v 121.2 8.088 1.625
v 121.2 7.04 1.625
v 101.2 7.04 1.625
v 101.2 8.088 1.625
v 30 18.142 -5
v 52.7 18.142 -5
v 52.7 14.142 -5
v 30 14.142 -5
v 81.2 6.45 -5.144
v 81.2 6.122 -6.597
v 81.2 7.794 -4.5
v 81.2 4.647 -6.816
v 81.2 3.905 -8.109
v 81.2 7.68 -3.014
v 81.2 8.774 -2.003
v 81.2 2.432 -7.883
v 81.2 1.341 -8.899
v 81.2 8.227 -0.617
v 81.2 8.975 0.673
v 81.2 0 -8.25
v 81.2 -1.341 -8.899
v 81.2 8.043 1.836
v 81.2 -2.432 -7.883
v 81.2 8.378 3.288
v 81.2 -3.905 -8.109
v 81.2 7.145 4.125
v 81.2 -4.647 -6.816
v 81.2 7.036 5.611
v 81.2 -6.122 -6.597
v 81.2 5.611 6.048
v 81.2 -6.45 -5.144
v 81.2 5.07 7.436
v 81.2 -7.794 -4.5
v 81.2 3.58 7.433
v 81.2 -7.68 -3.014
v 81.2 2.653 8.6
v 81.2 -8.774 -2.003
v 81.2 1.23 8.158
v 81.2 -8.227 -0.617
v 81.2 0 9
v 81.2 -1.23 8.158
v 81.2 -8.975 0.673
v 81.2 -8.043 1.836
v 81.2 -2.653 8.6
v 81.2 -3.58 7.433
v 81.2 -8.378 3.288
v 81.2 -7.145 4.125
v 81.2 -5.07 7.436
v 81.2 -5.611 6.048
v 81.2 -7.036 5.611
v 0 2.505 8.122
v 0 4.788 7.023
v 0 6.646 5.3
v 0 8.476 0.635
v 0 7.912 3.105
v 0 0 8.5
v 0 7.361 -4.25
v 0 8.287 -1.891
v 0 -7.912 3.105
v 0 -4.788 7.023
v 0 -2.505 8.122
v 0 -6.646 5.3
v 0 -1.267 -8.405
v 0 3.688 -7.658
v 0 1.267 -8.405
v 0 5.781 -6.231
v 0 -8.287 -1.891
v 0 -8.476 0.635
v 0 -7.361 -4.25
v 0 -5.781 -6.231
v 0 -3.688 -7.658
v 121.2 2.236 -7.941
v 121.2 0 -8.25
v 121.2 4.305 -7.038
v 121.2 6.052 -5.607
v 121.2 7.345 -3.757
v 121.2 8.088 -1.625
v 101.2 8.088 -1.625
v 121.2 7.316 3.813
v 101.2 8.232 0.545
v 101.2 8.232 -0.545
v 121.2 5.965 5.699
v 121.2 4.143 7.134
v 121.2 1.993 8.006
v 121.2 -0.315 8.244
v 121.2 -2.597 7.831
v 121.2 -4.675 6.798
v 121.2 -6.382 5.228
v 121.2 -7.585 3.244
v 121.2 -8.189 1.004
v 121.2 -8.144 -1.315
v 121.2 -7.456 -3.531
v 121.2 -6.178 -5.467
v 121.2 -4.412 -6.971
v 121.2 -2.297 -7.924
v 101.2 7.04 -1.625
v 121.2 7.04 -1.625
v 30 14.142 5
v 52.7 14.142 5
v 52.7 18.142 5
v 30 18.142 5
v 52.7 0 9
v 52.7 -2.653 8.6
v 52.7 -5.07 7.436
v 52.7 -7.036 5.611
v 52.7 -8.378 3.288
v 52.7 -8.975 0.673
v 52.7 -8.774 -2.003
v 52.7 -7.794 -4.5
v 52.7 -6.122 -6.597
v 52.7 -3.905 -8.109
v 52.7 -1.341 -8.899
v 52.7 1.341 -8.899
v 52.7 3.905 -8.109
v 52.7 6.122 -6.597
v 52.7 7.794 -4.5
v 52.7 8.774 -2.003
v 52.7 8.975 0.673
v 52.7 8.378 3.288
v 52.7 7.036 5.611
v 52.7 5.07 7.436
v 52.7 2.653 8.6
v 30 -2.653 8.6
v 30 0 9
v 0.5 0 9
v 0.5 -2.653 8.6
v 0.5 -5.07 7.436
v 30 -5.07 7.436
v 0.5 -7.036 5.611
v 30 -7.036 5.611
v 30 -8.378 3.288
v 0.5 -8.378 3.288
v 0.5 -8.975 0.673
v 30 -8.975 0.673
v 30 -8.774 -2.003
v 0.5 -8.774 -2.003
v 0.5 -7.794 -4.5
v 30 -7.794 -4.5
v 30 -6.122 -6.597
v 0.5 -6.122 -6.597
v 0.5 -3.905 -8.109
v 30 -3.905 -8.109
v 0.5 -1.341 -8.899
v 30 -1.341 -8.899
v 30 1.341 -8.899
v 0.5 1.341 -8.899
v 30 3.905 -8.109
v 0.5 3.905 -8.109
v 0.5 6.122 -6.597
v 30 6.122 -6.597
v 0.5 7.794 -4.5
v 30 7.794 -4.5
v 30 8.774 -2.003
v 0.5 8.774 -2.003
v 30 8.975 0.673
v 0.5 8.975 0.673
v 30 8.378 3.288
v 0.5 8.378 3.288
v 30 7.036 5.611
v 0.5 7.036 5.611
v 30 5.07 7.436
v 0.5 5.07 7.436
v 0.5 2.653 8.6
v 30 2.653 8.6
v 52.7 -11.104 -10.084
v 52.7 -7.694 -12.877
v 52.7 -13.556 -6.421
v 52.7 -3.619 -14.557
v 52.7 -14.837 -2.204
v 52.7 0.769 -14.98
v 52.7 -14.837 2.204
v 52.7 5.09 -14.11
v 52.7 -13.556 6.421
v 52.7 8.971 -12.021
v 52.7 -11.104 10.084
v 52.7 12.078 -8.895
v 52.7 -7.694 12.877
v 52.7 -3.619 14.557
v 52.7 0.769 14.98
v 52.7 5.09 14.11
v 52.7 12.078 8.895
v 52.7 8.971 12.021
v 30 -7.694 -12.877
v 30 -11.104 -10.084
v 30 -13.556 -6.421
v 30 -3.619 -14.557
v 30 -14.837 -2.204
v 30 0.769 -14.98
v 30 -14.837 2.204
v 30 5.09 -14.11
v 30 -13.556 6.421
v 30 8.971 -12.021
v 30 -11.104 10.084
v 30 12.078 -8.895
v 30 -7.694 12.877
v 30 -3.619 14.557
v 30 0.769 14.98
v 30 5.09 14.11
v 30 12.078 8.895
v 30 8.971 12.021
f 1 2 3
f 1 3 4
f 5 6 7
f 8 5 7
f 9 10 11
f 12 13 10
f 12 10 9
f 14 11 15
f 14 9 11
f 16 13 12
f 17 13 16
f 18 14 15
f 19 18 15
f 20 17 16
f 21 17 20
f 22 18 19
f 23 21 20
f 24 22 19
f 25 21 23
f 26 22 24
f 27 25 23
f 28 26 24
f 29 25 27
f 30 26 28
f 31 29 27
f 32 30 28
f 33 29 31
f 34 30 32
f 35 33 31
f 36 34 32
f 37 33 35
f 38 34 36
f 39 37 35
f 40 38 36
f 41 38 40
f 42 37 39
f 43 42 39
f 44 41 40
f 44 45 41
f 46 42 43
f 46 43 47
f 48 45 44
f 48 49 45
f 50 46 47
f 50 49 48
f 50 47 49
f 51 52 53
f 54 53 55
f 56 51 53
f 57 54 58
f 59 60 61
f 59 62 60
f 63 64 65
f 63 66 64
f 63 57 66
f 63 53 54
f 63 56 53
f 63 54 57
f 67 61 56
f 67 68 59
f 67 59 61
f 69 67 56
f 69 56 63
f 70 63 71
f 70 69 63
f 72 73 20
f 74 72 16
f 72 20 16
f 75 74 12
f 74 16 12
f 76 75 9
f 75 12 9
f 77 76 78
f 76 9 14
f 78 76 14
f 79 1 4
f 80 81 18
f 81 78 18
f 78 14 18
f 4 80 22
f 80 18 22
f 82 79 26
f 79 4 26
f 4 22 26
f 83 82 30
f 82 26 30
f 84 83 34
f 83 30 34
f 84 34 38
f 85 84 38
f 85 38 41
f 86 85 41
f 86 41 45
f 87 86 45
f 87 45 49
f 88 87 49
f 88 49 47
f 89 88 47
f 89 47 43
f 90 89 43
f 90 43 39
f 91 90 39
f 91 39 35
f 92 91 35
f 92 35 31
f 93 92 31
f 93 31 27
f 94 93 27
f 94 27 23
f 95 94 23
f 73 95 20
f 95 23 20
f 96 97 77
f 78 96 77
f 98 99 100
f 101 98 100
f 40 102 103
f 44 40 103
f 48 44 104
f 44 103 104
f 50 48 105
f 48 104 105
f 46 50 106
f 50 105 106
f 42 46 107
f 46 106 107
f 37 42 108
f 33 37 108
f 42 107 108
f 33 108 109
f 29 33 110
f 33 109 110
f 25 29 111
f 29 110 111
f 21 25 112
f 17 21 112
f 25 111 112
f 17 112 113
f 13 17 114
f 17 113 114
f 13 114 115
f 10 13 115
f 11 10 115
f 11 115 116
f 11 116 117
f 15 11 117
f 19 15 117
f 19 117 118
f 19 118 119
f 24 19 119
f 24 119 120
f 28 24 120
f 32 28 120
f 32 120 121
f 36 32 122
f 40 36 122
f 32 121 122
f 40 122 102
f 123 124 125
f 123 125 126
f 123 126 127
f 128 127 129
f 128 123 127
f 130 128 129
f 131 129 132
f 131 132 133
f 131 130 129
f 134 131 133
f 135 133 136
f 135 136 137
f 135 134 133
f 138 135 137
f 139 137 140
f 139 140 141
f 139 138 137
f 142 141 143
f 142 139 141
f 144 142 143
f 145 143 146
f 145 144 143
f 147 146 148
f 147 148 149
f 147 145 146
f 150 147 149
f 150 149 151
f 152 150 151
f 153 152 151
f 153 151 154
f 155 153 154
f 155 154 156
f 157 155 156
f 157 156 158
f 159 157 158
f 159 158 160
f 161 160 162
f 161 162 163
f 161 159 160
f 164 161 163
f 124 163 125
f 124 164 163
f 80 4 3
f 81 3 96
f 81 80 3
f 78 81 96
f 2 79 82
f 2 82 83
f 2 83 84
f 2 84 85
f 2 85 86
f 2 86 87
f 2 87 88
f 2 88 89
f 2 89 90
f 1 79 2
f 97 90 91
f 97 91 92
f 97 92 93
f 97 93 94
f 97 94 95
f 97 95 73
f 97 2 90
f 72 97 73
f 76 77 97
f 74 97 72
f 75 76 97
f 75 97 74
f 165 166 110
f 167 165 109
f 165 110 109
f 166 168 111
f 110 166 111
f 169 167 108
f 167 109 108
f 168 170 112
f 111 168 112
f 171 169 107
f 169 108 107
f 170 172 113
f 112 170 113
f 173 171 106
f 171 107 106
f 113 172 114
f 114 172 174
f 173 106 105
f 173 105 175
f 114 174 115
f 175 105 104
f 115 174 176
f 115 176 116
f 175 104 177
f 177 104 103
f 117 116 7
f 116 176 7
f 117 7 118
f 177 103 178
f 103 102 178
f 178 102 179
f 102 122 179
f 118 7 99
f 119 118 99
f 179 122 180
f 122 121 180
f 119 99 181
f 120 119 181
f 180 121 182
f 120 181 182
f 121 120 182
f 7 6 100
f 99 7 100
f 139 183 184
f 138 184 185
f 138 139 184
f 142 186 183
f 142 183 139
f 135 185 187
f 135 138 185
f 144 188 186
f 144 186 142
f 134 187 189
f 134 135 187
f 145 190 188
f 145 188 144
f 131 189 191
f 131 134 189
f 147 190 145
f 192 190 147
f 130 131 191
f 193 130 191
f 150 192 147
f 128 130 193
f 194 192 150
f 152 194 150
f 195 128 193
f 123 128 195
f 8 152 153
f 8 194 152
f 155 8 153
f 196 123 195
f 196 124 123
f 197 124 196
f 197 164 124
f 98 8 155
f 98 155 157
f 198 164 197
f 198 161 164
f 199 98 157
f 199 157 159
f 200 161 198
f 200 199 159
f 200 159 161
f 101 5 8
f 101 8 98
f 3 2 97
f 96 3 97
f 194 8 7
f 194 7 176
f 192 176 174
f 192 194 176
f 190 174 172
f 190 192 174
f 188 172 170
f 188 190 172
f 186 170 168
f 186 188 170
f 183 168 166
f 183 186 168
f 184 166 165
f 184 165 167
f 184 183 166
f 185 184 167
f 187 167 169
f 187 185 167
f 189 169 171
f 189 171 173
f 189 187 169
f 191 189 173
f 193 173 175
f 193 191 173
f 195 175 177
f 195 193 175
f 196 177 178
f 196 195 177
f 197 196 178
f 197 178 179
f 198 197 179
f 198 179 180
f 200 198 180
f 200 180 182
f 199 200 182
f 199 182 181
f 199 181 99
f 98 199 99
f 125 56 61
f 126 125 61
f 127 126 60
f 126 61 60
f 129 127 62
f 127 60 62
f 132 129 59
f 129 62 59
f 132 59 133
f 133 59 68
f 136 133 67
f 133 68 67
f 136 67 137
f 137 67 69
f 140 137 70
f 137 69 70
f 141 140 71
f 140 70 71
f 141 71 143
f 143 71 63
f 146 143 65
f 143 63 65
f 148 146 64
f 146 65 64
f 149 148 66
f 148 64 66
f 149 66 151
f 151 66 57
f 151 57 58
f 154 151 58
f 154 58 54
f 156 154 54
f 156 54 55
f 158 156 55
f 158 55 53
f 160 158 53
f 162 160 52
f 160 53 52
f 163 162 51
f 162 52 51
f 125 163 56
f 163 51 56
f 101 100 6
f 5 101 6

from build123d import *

# Parameters (mm, degrees)
SKETCH1_W           = 30
SKETCH1_H           = 9
BOSS_EXTRUDE1_DEPTH = 22.7
SKETCH3_R           = 9
BOSS_EXTRUDE2_DEPTH = 28.5
SKETCH4_R           = 8.25
BOSS_EXTRUDE3_DEPTH = 40
SKETCH5_W           = 3.25
SKETCH5_H           = 1.5
CUT_EXTRUDE1_DEPTH  = 20
CHAMFER1_SIZE       = 0.5


with BuildPart() as part:
    # Sketch1 → Revolve1 (revolve)
    with BuildSketch(Plane.XY, mode=Mode.PRIVATE) as revolve1_sk:
        with Locations((15, 4.5)):
            Rectangle(SKETCH1_W, SKETCH1_H)
    revolve(revolve1_sk.sketch.rotate(Axis((0, 0, 0), (1, 0, 0)), 90), axis=Axis((0, 0, 0), (1, 0, 0)))

    # Sketch2 → Boss-Extrude1 (add)
    with BuildSketch(Plane(origin=(30, 0, 0), x_dir=(0, 0, -1), z_dir=(1, 0, 0))):
        with BuildLine():
            Line((-5, 18.142135624), (5, 18.142135624))
            Line((5, 18.142135624), (5, 14.142135624))
            ThreePointArc((5, 14.142135624), (0, -15), (-5, 14.142135624))
            Line((-5, 14.142135624), (-5, 18.142135624))
        make_face()
    extrude(amount=BOSS_EXTRUDE1_DEPTH)

    # Sketch3 → Boss-Extrude2 (add)
    with BuildSketch(Plane(origin=(52.7, 0, 0), x_dir=(0, 0, -1), z_dir=(1, 0, 0))):
        with Locations(Location((0, 0, 0), (0, 0, 180))):
            Circle(SKETCH3_R)
    extrude(amount=BOSS_EXTRUDE2_DEPTH)

    # Sketch4 → Boss-Extrude3 (add)
    with BuildSketch(Plane(origin=(81.2, 0, 0), x_dir=(0, 0, -1), z_dir=(1, 0, 0))):
        Circle(SKETCH4_R)
    extrude(amount=BOSS_EXTRUDE3_DEPTH)

    # Sketch5 → Cut-Extrude1 (cut)
    with BuildSketch(Plane(origin=(121.2, 0, 0), x_dir=(0, 0, -1), z_dir=(1, 0, 0))):
        with Locations((0, 7.79)):
            Rectangle(SKETCH5_W, SKETCH5_H)
    extrude(amount=-CUT_EXTRUDE1_DEPTH, mode=Mode.SUBTRACT)

    # Chamfer1
    chamfer1_edges = [part.edges().sort_by_distance(p)[0] for p in [
        (0, 0, -9),
    ]]
    chamfer(chamfer1_edges, length=CHAMFER1_SIZE)


solid = part.part
